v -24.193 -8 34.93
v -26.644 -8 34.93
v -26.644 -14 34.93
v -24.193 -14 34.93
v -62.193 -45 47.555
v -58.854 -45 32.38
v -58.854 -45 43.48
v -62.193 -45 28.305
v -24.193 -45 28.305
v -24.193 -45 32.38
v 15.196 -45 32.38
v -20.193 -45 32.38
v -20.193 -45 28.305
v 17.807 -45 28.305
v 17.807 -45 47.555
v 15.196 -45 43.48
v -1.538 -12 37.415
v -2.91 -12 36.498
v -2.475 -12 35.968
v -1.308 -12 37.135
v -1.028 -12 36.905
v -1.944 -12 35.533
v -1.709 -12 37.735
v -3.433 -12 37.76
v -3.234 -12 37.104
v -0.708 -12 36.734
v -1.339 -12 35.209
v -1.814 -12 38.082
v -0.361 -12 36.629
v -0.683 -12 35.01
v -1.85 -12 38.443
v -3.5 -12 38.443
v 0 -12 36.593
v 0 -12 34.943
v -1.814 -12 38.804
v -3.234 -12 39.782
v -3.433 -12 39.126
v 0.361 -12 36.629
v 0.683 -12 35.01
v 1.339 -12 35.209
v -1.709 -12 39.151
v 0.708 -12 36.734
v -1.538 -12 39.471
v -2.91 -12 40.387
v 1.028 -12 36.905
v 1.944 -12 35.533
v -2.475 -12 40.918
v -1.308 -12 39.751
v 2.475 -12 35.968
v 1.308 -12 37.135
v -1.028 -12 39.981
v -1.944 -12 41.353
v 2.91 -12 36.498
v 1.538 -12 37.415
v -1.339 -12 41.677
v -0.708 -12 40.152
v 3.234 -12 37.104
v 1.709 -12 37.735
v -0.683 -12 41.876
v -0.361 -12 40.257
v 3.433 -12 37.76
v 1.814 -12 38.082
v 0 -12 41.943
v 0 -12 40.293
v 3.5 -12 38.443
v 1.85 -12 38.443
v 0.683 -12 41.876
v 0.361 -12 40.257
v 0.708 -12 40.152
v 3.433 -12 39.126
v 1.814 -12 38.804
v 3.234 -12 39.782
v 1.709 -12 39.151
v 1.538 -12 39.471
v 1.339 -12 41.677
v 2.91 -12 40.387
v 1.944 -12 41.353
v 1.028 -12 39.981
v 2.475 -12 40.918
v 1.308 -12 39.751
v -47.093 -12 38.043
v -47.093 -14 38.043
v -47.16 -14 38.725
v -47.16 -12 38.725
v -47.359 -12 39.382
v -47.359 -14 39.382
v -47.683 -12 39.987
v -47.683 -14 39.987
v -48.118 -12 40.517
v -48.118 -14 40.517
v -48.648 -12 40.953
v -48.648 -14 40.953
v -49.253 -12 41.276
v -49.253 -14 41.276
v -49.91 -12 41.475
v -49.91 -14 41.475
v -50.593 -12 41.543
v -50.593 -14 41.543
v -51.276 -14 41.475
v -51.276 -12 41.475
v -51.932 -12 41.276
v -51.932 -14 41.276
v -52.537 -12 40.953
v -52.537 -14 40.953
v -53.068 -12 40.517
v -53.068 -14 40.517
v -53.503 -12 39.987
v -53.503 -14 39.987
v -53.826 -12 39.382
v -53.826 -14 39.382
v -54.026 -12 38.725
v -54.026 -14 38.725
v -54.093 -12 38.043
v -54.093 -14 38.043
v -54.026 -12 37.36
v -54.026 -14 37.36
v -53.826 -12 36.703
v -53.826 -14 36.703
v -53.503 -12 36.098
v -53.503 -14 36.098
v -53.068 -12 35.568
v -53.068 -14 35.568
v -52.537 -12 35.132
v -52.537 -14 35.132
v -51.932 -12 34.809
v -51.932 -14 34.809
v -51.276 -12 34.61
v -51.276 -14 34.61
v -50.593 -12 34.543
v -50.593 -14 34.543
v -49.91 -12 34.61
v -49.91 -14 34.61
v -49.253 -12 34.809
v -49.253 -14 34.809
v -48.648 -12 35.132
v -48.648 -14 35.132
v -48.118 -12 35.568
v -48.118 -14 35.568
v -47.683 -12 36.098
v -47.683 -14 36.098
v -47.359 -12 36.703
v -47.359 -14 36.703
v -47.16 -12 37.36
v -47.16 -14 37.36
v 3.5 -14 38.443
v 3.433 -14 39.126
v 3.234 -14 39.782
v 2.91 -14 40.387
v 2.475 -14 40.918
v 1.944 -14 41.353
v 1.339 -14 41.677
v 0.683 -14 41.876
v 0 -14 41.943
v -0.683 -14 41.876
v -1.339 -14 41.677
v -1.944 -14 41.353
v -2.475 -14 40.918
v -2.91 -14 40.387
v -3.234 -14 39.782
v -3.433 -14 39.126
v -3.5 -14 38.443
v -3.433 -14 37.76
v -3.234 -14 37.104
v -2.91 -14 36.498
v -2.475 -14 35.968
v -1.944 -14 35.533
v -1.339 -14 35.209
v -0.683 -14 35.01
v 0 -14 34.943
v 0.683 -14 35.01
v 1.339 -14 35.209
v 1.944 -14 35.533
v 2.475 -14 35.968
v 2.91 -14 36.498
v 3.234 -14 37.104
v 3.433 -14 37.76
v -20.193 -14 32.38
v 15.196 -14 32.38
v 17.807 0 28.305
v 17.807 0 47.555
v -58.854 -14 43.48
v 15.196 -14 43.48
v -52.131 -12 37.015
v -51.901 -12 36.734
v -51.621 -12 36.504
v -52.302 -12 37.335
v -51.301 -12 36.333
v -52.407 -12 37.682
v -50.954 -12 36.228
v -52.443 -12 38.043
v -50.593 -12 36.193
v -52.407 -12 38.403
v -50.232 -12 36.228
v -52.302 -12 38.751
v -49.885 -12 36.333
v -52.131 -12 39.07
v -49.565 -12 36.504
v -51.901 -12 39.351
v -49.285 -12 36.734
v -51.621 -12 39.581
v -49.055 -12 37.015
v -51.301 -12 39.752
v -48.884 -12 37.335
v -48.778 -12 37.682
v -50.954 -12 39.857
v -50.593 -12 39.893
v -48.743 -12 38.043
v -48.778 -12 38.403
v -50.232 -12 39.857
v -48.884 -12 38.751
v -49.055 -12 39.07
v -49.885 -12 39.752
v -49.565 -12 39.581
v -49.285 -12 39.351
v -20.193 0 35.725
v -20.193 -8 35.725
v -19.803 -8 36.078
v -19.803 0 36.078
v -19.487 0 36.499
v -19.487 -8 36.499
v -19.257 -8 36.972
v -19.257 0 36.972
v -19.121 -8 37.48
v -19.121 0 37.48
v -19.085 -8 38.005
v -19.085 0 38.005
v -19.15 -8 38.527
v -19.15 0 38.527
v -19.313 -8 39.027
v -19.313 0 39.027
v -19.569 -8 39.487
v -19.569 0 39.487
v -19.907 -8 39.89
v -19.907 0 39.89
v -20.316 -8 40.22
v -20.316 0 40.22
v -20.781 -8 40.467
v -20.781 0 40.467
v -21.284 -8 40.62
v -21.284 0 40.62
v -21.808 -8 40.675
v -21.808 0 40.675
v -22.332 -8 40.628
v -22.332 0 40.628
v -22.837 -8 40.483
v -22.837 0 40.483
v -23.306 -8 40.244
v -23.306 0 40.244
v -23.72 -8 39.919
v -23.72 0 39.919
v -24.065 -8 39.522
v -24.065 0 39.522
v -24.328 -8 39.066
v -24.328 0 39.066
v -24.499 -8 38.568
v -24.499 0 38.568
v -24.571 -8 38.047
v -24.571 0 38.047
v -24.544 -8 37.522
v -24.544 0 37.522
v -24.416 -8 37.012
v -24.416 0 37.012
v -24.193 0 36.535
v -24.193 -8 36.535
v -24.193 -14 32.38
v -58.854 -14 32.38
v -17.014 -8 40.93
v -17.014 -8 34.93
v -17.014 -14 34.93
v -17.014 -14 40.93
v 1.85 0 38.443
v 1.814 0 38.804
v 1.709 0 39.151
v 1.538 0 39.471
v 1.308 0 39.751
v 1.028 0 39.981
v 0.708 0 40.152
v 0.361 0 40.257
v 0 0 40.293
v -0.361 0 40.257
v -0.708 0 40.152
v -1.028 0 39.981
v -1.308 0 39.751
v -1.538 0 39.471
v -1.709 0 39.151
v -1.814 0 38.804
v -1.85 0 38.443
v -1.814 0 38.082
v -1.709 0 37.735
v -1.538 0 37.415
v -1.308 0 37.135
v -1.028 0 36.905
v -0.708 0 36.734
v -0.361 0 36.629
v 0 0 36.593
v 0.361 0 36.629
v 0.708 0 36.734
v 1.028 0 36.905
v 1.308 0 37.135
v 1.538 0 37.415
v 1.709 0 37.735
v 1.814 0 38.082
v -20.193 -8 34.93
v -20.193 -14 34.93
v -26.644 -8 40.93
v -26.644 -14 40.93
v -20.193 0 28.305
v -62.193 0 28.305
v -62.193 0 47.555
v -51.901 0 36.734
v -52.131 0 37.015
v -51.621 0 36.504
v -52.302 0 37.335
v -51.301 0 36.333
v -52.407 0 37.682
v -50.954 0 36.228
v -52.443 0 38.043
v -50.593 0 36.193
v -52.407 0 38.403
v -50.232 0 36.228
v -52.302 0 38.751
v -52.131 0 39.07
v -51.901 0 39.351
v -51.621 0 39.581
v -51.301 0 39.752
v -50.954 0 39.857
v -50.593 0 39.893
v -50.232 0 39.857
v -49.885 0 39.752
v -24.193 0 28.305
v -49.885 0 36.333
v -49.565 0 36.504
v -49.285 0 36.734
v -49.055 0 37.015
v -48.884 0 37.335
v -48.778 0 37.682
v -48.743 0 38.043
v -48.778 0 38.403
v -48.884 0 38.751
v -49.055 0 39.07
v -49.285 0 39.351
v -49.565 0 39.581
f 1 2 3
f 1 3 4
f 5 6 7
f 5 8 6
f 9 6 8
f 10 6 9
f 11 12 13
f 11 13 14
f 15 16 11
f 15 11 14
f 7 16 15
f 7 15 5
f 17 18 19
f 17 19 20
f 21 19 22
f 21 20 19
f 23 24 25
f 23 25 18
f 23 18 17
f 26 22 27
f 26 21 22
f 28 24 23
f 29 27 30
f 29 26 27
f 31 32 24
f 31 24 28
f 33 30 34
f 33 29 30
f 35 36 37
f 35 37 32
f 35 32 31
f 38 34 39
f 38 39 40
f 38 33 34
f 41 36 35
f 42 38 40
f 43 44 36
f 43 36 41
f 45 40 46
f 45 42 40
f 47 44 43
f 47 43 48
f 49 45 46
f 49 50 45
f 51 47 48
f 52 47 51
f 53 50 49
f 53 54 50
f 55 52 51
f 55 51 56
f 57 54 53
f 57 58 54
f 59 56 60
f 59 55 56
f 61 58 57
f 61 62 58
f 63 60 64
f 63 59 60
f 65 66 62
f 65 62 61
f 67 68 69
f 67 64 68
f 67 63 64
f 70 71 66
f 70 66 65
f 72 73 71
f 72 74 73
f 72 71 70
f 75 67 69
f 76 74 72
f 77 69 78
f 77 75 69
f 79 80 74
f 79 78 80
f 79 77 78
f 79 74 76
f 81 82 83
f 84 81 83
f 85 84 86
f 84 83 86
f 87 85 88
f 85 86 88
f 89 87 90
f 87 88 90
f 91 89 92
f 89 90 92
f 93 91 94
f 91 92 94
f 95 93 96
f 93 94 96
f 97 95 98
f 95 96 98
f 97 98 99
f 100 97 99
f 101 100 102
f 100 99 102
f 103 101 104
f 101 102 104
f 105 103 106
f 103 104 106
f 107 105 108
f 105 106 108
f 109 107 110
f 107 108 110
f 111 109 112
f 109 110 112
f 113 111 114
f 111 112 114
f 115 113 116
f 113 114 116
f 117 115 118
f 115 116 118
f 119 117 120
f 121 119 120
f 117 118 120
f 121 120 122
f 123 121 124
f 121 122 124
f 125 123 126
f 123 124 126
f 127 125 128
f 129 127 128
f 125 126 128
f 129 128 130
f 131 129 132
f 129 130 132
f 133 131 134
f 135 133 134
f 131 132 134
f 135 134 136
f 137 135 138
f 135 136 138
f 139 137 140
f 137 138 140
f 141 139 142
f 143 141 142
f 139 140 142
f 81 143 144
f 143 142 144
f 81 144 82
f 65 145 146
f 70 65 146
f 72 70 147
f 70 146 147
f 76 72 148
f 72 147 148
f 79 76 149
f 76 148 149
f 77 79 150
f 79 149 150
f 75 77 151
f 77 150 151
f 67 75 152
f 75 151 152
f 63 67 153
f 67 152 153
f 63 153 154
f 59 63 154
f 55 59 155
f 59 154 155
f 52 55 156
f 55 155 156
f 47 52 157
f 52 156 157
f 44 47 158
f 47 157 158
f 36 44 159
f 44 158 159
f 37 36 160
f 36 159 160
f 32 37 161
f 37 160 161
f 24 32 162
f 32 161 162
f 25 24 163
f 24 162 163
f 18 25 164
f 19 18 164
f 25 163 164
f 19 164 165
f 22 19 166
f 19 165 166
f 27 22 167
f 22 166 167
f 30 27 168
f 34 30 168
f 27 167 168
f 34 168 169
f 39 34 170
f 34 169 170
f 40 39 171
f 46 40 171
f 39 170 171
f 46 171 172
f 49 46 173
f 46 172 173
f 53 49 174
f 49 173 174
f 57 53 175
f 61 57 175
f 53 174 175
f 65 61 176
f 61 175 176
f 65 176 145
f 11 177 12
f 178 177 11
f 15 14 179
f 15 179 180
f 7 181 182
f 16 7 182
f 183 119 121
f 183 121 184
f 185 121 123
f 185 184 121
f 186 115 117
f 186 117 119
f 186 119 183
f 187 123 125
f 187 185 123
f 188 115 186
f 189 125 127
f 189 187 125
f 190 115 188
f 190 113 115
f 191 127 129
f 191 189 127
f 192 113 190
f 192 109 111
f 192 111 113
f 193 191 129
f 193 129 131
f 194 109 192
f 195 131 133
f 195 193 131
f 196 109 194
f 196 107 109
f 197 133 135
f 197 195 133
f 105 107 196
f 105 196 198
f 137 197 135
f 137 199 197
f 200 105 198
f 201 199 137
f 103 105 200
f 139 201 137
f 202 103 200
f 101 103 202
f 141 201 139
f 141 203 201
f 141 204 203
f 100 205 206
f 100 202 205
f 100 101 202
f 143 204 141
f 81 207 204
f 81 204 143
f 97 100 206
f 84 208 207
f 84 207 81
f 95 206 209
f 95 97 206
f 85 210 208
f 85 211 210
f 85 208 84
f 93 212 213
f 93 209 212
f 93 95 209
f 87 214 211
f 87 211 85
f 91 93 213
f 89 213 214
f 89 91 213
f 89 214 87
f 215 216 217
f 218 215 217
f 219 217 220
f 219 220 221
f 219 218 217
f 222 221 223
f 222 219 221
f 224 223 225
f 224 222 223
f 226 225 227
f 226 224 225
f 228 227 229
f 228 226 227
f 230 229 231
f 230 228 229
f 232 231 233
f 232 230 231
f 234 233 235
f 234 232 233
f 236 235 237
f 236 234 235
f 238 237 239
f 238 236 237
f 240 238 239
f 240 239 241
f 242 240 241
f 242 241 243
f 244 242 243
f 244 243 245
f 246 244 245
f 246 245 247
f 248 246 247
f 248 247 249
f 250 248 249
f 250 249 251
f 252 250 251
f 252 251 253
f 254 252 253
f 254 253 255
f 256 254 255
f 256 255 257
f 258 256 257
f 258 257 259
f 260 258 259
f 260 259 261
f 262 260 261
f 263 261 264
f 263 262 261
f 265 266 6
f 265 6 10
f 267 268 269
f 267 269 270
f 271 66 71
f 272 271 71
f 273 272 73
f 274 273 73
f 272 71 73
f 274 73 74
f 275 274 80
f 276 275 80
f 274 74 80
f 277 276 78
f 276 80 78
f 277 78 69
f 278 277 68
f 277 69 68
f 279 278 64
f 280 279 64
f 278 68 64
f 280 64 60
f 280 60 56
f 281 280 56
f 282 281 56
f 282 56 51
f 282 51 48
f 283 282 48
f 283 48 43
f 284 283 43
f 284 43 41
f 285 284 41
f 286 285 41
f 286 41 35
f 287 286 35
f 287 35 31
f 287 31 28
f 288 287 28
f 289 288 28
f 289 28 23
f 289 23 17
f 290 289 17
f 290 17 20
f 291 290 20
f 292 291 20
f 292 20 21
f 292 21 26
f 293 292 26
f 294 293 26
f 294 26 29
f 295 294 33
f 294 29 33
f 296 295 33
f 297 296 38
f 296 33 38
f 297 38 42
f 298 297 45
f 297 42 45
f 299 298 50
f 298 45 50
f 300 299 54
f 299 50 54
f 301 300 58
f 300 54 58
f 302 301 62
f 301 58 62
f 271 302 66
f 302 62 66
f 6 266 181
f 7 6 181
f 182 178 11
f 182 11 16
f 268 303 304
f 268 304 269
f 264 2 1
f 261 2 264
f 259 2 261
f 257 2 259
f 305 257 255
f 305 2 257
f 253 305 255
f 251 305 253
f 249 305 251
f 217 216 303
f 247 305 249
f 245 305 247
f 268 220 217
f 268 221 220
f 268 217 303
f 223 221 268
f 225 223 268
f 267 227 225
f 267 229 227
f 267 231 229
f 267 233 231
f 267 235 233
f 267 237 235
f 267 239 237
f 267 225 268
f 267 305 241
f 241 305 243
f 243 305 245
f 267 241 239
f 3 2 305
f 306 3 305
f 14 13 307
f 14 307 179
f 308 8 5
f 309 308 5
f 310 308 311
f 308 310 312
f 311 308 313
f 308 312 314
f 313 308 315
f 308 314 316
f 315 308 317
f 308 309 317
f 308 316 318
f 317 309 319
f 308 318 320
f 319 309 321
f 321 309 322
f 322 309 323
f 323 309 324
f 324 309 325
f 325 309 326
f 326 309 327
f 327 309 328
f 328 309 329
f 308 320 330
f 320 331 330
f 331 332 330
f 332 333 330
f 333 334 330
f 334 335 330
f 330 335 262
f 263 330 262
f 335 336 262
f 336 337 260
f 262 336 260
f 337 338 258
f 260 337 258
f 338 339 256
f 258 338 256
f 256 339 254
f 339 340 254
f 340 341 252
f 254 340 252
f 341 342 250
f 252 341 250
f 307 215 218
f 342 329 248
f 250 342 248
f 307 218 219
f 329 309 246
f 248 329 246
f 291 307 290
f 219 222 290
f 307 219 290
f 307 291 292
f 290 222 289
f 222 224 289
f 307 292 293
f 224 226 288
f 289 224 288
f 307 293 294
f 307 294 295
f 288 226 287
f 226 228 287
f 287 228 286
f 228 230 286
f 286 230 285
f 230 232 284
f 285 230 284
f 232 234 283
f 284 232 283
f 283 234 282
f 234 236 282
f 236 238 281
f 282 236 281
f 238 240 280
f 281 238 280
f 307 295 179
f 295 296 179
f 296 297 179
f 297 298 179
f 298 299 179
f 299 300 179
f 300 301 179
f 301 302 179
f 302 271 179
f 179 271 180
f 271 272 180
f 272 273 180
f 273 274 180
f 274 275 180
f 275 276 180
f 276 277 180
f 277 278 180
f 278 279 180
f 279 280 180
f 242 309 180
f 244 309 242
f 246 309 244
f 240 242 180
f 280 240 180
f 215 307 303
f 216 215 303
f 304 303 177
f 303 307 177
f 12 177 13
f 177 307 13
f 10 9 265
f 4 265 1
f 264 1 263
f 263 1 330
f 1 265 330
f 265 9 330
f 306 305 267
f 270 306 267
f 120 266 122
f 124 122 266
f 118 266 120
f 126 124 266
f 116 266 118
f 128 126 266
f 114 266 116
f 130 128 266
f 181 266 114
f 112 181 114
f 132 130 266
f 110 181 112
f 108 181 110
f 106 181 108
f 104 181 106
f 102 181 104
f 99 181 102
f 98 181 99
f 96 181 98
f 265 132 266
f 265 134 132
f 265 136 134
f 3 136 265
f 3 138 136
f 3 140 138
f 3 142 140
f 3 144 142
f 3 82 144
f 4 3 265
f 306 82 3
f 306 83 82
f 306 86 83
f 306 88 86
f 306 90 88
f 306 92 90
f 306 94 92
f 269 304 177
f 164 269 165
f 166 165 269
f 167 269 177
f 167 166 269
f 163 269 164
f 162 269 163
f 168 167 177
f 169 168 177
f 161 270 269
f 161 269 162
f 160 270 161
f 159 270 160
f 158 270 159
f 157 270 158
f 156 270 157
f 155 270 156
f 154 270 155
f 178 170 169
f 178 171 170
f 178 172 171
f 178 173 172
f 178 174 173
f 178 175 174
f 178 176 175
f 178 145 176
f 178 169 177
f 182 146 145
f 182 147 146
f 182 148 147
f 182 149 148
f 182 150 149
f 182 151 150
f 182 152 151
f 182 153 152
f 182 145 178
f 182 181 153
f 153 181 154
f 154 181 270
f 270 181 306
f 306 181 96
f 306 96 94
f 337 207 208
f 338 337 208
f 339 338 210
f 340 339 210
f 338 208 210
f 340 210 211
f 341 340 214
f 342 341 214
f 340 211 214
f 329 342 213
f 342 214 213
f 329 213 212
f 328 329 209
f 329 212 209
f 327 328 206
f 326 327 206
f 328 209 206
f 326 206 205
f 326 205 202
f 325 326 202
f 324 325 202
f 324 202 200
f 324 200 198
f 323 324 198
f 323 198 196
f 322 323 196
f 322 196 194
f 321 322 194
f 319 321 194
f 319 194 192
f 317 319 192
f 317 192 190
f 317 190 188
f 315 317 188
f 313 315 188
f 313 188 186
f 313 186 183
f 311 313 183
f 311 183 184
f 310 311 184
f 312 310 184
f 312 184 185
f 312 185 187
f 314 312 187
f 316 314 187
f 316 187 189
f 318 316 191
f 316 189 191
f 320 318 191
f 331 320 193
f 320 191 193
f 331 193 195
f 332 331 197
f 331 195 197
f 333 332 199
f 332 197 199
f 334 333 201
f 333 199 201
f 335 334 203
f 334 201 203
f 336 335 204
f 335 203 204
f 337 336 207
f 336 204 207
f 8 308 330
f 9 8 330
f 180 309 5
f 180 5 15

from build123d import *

# Parameters (mm, degrees)
F0_W      = 80
F0_H      = 19.25
F0_W_2    = 74.05
F0_H_2    = 11.1
F1_DEPTH  = 45
F0_W_3    = 9.63
F0_H_3    = 6
F2_DEPTH  = 14
F0_R      = 2.745
F3_DEPTH  = 8
F5_W      = 4
F5_H      = 29.0582341515
F6_DEPTH  = 3.07077
F5_H_2    = 15.9417658485
F7_DEPTH  = 8.2825263962
F11_R     = 3.5
F11_R_2   = 1.85
F12_DEPTH = 2
F13_DEPTH = 25


with BuildPart() as f1:
    # F0 (on Front) → F1 (new body)
    with BuildSketch(Plane.XZ):
        with Locations((-22.1932545304, 37.9297346771)):
            Rectangle(F0_W, F0_H)
        with Locations((-21.8290186286, 37.9297346771)):
            Rectangle(F0_W_2, F0_H_2, mode=Mode.SUBTRACT)
    extrude(amount=F1_DEPTH)

    # F0 (on Front) → F2 (join)
    with BuildSketch(Plane.XZ):
        with Locations((-21.8290186286, 37.9297346771)):
            Rectangle(F0_W_2, F0_H_2)
        with Locations((-21.8290186286, 37.9297346771)):
            Rectangle(F0_W_3, F0_H_3, mode=Mode.SUBTRACT)
    extrude(amount=F2_DEPTH)

    # F0 (on Front) → F3 (join)
    with BuildSketch(Plane.XZ):
        with Locations((-21.8290186286, 37.9297346771)):
            Rectangle(F0_W_3, F0_H_3)
        with Locations((-21.8290186286, 37.9297346771)):
            Circle(F0_R, mode=Mode.SUBTRACT)
    extrude(amount=F3_DEPTH)

    # F5 (on offset) → F6 (cut)
    with BuildSketch(Plane(origin=(0, 0, 28.3047346771), x_dir=(1, 0, 0), z_dir=(0, 0, -1))):
        with Locations((-22.1932545304, 30.4708829243)):
            Rectangle(F5_W, F5_H)
    extrude(amount=-F6_DEPTH, mode=Mode.SUBTRACT)

    # F5 (on offset) → F7 (cut)
    with BuildSketch(Plane(origin=(0, 0, 28.3047346771), x_dir=(1, 0, 0), z_dir=(0, 0, -1))):
        with Locations((-22.1932545304, 30.4708829243)):
            Rectangle(F5_W, F5_H)
        with Locations((-22.1932545304, 7.9708829243)):
            Rectangle(F5_W, F5_H_2)
    extrude(amount=-F7_DEPTH, mode=Mode.SUBTRACT)

    # F11 (on offset) → F12 (cut)
    with BuildSketch(Plane.XZ.offset(14)):
        with Locations((-50.5927884306, 38.0425482406)):
            Circle(F11_R)
        with Locations((-50.5927884306, 38.0425482406)):
            Circle(F11_R_2, mode=Mode.SUBTRACT)
        with Locations((0, 38.4429908707)):
            Circle(F11_R)
        with Locations((0, 38.4429908707)):
            Circle(F11_R_2, mode=Mode.SUBTRACT)
    extrude(amount=-F12_DEPTH, mode=Mode.SUBTRACT)

    # F13 (cut): faces of the model
    f13_faces = [f1.faces().sort_by_distance(p)[0] for p in [
        (0, -14, 38.4429908707),
        (-50.5927884306, -14, 38.0425482406),
    ]]
    extrude(f13_faces, amount=-F13_DEPTH, mode=Mode.SUBTRACT)


solid = f1.part
